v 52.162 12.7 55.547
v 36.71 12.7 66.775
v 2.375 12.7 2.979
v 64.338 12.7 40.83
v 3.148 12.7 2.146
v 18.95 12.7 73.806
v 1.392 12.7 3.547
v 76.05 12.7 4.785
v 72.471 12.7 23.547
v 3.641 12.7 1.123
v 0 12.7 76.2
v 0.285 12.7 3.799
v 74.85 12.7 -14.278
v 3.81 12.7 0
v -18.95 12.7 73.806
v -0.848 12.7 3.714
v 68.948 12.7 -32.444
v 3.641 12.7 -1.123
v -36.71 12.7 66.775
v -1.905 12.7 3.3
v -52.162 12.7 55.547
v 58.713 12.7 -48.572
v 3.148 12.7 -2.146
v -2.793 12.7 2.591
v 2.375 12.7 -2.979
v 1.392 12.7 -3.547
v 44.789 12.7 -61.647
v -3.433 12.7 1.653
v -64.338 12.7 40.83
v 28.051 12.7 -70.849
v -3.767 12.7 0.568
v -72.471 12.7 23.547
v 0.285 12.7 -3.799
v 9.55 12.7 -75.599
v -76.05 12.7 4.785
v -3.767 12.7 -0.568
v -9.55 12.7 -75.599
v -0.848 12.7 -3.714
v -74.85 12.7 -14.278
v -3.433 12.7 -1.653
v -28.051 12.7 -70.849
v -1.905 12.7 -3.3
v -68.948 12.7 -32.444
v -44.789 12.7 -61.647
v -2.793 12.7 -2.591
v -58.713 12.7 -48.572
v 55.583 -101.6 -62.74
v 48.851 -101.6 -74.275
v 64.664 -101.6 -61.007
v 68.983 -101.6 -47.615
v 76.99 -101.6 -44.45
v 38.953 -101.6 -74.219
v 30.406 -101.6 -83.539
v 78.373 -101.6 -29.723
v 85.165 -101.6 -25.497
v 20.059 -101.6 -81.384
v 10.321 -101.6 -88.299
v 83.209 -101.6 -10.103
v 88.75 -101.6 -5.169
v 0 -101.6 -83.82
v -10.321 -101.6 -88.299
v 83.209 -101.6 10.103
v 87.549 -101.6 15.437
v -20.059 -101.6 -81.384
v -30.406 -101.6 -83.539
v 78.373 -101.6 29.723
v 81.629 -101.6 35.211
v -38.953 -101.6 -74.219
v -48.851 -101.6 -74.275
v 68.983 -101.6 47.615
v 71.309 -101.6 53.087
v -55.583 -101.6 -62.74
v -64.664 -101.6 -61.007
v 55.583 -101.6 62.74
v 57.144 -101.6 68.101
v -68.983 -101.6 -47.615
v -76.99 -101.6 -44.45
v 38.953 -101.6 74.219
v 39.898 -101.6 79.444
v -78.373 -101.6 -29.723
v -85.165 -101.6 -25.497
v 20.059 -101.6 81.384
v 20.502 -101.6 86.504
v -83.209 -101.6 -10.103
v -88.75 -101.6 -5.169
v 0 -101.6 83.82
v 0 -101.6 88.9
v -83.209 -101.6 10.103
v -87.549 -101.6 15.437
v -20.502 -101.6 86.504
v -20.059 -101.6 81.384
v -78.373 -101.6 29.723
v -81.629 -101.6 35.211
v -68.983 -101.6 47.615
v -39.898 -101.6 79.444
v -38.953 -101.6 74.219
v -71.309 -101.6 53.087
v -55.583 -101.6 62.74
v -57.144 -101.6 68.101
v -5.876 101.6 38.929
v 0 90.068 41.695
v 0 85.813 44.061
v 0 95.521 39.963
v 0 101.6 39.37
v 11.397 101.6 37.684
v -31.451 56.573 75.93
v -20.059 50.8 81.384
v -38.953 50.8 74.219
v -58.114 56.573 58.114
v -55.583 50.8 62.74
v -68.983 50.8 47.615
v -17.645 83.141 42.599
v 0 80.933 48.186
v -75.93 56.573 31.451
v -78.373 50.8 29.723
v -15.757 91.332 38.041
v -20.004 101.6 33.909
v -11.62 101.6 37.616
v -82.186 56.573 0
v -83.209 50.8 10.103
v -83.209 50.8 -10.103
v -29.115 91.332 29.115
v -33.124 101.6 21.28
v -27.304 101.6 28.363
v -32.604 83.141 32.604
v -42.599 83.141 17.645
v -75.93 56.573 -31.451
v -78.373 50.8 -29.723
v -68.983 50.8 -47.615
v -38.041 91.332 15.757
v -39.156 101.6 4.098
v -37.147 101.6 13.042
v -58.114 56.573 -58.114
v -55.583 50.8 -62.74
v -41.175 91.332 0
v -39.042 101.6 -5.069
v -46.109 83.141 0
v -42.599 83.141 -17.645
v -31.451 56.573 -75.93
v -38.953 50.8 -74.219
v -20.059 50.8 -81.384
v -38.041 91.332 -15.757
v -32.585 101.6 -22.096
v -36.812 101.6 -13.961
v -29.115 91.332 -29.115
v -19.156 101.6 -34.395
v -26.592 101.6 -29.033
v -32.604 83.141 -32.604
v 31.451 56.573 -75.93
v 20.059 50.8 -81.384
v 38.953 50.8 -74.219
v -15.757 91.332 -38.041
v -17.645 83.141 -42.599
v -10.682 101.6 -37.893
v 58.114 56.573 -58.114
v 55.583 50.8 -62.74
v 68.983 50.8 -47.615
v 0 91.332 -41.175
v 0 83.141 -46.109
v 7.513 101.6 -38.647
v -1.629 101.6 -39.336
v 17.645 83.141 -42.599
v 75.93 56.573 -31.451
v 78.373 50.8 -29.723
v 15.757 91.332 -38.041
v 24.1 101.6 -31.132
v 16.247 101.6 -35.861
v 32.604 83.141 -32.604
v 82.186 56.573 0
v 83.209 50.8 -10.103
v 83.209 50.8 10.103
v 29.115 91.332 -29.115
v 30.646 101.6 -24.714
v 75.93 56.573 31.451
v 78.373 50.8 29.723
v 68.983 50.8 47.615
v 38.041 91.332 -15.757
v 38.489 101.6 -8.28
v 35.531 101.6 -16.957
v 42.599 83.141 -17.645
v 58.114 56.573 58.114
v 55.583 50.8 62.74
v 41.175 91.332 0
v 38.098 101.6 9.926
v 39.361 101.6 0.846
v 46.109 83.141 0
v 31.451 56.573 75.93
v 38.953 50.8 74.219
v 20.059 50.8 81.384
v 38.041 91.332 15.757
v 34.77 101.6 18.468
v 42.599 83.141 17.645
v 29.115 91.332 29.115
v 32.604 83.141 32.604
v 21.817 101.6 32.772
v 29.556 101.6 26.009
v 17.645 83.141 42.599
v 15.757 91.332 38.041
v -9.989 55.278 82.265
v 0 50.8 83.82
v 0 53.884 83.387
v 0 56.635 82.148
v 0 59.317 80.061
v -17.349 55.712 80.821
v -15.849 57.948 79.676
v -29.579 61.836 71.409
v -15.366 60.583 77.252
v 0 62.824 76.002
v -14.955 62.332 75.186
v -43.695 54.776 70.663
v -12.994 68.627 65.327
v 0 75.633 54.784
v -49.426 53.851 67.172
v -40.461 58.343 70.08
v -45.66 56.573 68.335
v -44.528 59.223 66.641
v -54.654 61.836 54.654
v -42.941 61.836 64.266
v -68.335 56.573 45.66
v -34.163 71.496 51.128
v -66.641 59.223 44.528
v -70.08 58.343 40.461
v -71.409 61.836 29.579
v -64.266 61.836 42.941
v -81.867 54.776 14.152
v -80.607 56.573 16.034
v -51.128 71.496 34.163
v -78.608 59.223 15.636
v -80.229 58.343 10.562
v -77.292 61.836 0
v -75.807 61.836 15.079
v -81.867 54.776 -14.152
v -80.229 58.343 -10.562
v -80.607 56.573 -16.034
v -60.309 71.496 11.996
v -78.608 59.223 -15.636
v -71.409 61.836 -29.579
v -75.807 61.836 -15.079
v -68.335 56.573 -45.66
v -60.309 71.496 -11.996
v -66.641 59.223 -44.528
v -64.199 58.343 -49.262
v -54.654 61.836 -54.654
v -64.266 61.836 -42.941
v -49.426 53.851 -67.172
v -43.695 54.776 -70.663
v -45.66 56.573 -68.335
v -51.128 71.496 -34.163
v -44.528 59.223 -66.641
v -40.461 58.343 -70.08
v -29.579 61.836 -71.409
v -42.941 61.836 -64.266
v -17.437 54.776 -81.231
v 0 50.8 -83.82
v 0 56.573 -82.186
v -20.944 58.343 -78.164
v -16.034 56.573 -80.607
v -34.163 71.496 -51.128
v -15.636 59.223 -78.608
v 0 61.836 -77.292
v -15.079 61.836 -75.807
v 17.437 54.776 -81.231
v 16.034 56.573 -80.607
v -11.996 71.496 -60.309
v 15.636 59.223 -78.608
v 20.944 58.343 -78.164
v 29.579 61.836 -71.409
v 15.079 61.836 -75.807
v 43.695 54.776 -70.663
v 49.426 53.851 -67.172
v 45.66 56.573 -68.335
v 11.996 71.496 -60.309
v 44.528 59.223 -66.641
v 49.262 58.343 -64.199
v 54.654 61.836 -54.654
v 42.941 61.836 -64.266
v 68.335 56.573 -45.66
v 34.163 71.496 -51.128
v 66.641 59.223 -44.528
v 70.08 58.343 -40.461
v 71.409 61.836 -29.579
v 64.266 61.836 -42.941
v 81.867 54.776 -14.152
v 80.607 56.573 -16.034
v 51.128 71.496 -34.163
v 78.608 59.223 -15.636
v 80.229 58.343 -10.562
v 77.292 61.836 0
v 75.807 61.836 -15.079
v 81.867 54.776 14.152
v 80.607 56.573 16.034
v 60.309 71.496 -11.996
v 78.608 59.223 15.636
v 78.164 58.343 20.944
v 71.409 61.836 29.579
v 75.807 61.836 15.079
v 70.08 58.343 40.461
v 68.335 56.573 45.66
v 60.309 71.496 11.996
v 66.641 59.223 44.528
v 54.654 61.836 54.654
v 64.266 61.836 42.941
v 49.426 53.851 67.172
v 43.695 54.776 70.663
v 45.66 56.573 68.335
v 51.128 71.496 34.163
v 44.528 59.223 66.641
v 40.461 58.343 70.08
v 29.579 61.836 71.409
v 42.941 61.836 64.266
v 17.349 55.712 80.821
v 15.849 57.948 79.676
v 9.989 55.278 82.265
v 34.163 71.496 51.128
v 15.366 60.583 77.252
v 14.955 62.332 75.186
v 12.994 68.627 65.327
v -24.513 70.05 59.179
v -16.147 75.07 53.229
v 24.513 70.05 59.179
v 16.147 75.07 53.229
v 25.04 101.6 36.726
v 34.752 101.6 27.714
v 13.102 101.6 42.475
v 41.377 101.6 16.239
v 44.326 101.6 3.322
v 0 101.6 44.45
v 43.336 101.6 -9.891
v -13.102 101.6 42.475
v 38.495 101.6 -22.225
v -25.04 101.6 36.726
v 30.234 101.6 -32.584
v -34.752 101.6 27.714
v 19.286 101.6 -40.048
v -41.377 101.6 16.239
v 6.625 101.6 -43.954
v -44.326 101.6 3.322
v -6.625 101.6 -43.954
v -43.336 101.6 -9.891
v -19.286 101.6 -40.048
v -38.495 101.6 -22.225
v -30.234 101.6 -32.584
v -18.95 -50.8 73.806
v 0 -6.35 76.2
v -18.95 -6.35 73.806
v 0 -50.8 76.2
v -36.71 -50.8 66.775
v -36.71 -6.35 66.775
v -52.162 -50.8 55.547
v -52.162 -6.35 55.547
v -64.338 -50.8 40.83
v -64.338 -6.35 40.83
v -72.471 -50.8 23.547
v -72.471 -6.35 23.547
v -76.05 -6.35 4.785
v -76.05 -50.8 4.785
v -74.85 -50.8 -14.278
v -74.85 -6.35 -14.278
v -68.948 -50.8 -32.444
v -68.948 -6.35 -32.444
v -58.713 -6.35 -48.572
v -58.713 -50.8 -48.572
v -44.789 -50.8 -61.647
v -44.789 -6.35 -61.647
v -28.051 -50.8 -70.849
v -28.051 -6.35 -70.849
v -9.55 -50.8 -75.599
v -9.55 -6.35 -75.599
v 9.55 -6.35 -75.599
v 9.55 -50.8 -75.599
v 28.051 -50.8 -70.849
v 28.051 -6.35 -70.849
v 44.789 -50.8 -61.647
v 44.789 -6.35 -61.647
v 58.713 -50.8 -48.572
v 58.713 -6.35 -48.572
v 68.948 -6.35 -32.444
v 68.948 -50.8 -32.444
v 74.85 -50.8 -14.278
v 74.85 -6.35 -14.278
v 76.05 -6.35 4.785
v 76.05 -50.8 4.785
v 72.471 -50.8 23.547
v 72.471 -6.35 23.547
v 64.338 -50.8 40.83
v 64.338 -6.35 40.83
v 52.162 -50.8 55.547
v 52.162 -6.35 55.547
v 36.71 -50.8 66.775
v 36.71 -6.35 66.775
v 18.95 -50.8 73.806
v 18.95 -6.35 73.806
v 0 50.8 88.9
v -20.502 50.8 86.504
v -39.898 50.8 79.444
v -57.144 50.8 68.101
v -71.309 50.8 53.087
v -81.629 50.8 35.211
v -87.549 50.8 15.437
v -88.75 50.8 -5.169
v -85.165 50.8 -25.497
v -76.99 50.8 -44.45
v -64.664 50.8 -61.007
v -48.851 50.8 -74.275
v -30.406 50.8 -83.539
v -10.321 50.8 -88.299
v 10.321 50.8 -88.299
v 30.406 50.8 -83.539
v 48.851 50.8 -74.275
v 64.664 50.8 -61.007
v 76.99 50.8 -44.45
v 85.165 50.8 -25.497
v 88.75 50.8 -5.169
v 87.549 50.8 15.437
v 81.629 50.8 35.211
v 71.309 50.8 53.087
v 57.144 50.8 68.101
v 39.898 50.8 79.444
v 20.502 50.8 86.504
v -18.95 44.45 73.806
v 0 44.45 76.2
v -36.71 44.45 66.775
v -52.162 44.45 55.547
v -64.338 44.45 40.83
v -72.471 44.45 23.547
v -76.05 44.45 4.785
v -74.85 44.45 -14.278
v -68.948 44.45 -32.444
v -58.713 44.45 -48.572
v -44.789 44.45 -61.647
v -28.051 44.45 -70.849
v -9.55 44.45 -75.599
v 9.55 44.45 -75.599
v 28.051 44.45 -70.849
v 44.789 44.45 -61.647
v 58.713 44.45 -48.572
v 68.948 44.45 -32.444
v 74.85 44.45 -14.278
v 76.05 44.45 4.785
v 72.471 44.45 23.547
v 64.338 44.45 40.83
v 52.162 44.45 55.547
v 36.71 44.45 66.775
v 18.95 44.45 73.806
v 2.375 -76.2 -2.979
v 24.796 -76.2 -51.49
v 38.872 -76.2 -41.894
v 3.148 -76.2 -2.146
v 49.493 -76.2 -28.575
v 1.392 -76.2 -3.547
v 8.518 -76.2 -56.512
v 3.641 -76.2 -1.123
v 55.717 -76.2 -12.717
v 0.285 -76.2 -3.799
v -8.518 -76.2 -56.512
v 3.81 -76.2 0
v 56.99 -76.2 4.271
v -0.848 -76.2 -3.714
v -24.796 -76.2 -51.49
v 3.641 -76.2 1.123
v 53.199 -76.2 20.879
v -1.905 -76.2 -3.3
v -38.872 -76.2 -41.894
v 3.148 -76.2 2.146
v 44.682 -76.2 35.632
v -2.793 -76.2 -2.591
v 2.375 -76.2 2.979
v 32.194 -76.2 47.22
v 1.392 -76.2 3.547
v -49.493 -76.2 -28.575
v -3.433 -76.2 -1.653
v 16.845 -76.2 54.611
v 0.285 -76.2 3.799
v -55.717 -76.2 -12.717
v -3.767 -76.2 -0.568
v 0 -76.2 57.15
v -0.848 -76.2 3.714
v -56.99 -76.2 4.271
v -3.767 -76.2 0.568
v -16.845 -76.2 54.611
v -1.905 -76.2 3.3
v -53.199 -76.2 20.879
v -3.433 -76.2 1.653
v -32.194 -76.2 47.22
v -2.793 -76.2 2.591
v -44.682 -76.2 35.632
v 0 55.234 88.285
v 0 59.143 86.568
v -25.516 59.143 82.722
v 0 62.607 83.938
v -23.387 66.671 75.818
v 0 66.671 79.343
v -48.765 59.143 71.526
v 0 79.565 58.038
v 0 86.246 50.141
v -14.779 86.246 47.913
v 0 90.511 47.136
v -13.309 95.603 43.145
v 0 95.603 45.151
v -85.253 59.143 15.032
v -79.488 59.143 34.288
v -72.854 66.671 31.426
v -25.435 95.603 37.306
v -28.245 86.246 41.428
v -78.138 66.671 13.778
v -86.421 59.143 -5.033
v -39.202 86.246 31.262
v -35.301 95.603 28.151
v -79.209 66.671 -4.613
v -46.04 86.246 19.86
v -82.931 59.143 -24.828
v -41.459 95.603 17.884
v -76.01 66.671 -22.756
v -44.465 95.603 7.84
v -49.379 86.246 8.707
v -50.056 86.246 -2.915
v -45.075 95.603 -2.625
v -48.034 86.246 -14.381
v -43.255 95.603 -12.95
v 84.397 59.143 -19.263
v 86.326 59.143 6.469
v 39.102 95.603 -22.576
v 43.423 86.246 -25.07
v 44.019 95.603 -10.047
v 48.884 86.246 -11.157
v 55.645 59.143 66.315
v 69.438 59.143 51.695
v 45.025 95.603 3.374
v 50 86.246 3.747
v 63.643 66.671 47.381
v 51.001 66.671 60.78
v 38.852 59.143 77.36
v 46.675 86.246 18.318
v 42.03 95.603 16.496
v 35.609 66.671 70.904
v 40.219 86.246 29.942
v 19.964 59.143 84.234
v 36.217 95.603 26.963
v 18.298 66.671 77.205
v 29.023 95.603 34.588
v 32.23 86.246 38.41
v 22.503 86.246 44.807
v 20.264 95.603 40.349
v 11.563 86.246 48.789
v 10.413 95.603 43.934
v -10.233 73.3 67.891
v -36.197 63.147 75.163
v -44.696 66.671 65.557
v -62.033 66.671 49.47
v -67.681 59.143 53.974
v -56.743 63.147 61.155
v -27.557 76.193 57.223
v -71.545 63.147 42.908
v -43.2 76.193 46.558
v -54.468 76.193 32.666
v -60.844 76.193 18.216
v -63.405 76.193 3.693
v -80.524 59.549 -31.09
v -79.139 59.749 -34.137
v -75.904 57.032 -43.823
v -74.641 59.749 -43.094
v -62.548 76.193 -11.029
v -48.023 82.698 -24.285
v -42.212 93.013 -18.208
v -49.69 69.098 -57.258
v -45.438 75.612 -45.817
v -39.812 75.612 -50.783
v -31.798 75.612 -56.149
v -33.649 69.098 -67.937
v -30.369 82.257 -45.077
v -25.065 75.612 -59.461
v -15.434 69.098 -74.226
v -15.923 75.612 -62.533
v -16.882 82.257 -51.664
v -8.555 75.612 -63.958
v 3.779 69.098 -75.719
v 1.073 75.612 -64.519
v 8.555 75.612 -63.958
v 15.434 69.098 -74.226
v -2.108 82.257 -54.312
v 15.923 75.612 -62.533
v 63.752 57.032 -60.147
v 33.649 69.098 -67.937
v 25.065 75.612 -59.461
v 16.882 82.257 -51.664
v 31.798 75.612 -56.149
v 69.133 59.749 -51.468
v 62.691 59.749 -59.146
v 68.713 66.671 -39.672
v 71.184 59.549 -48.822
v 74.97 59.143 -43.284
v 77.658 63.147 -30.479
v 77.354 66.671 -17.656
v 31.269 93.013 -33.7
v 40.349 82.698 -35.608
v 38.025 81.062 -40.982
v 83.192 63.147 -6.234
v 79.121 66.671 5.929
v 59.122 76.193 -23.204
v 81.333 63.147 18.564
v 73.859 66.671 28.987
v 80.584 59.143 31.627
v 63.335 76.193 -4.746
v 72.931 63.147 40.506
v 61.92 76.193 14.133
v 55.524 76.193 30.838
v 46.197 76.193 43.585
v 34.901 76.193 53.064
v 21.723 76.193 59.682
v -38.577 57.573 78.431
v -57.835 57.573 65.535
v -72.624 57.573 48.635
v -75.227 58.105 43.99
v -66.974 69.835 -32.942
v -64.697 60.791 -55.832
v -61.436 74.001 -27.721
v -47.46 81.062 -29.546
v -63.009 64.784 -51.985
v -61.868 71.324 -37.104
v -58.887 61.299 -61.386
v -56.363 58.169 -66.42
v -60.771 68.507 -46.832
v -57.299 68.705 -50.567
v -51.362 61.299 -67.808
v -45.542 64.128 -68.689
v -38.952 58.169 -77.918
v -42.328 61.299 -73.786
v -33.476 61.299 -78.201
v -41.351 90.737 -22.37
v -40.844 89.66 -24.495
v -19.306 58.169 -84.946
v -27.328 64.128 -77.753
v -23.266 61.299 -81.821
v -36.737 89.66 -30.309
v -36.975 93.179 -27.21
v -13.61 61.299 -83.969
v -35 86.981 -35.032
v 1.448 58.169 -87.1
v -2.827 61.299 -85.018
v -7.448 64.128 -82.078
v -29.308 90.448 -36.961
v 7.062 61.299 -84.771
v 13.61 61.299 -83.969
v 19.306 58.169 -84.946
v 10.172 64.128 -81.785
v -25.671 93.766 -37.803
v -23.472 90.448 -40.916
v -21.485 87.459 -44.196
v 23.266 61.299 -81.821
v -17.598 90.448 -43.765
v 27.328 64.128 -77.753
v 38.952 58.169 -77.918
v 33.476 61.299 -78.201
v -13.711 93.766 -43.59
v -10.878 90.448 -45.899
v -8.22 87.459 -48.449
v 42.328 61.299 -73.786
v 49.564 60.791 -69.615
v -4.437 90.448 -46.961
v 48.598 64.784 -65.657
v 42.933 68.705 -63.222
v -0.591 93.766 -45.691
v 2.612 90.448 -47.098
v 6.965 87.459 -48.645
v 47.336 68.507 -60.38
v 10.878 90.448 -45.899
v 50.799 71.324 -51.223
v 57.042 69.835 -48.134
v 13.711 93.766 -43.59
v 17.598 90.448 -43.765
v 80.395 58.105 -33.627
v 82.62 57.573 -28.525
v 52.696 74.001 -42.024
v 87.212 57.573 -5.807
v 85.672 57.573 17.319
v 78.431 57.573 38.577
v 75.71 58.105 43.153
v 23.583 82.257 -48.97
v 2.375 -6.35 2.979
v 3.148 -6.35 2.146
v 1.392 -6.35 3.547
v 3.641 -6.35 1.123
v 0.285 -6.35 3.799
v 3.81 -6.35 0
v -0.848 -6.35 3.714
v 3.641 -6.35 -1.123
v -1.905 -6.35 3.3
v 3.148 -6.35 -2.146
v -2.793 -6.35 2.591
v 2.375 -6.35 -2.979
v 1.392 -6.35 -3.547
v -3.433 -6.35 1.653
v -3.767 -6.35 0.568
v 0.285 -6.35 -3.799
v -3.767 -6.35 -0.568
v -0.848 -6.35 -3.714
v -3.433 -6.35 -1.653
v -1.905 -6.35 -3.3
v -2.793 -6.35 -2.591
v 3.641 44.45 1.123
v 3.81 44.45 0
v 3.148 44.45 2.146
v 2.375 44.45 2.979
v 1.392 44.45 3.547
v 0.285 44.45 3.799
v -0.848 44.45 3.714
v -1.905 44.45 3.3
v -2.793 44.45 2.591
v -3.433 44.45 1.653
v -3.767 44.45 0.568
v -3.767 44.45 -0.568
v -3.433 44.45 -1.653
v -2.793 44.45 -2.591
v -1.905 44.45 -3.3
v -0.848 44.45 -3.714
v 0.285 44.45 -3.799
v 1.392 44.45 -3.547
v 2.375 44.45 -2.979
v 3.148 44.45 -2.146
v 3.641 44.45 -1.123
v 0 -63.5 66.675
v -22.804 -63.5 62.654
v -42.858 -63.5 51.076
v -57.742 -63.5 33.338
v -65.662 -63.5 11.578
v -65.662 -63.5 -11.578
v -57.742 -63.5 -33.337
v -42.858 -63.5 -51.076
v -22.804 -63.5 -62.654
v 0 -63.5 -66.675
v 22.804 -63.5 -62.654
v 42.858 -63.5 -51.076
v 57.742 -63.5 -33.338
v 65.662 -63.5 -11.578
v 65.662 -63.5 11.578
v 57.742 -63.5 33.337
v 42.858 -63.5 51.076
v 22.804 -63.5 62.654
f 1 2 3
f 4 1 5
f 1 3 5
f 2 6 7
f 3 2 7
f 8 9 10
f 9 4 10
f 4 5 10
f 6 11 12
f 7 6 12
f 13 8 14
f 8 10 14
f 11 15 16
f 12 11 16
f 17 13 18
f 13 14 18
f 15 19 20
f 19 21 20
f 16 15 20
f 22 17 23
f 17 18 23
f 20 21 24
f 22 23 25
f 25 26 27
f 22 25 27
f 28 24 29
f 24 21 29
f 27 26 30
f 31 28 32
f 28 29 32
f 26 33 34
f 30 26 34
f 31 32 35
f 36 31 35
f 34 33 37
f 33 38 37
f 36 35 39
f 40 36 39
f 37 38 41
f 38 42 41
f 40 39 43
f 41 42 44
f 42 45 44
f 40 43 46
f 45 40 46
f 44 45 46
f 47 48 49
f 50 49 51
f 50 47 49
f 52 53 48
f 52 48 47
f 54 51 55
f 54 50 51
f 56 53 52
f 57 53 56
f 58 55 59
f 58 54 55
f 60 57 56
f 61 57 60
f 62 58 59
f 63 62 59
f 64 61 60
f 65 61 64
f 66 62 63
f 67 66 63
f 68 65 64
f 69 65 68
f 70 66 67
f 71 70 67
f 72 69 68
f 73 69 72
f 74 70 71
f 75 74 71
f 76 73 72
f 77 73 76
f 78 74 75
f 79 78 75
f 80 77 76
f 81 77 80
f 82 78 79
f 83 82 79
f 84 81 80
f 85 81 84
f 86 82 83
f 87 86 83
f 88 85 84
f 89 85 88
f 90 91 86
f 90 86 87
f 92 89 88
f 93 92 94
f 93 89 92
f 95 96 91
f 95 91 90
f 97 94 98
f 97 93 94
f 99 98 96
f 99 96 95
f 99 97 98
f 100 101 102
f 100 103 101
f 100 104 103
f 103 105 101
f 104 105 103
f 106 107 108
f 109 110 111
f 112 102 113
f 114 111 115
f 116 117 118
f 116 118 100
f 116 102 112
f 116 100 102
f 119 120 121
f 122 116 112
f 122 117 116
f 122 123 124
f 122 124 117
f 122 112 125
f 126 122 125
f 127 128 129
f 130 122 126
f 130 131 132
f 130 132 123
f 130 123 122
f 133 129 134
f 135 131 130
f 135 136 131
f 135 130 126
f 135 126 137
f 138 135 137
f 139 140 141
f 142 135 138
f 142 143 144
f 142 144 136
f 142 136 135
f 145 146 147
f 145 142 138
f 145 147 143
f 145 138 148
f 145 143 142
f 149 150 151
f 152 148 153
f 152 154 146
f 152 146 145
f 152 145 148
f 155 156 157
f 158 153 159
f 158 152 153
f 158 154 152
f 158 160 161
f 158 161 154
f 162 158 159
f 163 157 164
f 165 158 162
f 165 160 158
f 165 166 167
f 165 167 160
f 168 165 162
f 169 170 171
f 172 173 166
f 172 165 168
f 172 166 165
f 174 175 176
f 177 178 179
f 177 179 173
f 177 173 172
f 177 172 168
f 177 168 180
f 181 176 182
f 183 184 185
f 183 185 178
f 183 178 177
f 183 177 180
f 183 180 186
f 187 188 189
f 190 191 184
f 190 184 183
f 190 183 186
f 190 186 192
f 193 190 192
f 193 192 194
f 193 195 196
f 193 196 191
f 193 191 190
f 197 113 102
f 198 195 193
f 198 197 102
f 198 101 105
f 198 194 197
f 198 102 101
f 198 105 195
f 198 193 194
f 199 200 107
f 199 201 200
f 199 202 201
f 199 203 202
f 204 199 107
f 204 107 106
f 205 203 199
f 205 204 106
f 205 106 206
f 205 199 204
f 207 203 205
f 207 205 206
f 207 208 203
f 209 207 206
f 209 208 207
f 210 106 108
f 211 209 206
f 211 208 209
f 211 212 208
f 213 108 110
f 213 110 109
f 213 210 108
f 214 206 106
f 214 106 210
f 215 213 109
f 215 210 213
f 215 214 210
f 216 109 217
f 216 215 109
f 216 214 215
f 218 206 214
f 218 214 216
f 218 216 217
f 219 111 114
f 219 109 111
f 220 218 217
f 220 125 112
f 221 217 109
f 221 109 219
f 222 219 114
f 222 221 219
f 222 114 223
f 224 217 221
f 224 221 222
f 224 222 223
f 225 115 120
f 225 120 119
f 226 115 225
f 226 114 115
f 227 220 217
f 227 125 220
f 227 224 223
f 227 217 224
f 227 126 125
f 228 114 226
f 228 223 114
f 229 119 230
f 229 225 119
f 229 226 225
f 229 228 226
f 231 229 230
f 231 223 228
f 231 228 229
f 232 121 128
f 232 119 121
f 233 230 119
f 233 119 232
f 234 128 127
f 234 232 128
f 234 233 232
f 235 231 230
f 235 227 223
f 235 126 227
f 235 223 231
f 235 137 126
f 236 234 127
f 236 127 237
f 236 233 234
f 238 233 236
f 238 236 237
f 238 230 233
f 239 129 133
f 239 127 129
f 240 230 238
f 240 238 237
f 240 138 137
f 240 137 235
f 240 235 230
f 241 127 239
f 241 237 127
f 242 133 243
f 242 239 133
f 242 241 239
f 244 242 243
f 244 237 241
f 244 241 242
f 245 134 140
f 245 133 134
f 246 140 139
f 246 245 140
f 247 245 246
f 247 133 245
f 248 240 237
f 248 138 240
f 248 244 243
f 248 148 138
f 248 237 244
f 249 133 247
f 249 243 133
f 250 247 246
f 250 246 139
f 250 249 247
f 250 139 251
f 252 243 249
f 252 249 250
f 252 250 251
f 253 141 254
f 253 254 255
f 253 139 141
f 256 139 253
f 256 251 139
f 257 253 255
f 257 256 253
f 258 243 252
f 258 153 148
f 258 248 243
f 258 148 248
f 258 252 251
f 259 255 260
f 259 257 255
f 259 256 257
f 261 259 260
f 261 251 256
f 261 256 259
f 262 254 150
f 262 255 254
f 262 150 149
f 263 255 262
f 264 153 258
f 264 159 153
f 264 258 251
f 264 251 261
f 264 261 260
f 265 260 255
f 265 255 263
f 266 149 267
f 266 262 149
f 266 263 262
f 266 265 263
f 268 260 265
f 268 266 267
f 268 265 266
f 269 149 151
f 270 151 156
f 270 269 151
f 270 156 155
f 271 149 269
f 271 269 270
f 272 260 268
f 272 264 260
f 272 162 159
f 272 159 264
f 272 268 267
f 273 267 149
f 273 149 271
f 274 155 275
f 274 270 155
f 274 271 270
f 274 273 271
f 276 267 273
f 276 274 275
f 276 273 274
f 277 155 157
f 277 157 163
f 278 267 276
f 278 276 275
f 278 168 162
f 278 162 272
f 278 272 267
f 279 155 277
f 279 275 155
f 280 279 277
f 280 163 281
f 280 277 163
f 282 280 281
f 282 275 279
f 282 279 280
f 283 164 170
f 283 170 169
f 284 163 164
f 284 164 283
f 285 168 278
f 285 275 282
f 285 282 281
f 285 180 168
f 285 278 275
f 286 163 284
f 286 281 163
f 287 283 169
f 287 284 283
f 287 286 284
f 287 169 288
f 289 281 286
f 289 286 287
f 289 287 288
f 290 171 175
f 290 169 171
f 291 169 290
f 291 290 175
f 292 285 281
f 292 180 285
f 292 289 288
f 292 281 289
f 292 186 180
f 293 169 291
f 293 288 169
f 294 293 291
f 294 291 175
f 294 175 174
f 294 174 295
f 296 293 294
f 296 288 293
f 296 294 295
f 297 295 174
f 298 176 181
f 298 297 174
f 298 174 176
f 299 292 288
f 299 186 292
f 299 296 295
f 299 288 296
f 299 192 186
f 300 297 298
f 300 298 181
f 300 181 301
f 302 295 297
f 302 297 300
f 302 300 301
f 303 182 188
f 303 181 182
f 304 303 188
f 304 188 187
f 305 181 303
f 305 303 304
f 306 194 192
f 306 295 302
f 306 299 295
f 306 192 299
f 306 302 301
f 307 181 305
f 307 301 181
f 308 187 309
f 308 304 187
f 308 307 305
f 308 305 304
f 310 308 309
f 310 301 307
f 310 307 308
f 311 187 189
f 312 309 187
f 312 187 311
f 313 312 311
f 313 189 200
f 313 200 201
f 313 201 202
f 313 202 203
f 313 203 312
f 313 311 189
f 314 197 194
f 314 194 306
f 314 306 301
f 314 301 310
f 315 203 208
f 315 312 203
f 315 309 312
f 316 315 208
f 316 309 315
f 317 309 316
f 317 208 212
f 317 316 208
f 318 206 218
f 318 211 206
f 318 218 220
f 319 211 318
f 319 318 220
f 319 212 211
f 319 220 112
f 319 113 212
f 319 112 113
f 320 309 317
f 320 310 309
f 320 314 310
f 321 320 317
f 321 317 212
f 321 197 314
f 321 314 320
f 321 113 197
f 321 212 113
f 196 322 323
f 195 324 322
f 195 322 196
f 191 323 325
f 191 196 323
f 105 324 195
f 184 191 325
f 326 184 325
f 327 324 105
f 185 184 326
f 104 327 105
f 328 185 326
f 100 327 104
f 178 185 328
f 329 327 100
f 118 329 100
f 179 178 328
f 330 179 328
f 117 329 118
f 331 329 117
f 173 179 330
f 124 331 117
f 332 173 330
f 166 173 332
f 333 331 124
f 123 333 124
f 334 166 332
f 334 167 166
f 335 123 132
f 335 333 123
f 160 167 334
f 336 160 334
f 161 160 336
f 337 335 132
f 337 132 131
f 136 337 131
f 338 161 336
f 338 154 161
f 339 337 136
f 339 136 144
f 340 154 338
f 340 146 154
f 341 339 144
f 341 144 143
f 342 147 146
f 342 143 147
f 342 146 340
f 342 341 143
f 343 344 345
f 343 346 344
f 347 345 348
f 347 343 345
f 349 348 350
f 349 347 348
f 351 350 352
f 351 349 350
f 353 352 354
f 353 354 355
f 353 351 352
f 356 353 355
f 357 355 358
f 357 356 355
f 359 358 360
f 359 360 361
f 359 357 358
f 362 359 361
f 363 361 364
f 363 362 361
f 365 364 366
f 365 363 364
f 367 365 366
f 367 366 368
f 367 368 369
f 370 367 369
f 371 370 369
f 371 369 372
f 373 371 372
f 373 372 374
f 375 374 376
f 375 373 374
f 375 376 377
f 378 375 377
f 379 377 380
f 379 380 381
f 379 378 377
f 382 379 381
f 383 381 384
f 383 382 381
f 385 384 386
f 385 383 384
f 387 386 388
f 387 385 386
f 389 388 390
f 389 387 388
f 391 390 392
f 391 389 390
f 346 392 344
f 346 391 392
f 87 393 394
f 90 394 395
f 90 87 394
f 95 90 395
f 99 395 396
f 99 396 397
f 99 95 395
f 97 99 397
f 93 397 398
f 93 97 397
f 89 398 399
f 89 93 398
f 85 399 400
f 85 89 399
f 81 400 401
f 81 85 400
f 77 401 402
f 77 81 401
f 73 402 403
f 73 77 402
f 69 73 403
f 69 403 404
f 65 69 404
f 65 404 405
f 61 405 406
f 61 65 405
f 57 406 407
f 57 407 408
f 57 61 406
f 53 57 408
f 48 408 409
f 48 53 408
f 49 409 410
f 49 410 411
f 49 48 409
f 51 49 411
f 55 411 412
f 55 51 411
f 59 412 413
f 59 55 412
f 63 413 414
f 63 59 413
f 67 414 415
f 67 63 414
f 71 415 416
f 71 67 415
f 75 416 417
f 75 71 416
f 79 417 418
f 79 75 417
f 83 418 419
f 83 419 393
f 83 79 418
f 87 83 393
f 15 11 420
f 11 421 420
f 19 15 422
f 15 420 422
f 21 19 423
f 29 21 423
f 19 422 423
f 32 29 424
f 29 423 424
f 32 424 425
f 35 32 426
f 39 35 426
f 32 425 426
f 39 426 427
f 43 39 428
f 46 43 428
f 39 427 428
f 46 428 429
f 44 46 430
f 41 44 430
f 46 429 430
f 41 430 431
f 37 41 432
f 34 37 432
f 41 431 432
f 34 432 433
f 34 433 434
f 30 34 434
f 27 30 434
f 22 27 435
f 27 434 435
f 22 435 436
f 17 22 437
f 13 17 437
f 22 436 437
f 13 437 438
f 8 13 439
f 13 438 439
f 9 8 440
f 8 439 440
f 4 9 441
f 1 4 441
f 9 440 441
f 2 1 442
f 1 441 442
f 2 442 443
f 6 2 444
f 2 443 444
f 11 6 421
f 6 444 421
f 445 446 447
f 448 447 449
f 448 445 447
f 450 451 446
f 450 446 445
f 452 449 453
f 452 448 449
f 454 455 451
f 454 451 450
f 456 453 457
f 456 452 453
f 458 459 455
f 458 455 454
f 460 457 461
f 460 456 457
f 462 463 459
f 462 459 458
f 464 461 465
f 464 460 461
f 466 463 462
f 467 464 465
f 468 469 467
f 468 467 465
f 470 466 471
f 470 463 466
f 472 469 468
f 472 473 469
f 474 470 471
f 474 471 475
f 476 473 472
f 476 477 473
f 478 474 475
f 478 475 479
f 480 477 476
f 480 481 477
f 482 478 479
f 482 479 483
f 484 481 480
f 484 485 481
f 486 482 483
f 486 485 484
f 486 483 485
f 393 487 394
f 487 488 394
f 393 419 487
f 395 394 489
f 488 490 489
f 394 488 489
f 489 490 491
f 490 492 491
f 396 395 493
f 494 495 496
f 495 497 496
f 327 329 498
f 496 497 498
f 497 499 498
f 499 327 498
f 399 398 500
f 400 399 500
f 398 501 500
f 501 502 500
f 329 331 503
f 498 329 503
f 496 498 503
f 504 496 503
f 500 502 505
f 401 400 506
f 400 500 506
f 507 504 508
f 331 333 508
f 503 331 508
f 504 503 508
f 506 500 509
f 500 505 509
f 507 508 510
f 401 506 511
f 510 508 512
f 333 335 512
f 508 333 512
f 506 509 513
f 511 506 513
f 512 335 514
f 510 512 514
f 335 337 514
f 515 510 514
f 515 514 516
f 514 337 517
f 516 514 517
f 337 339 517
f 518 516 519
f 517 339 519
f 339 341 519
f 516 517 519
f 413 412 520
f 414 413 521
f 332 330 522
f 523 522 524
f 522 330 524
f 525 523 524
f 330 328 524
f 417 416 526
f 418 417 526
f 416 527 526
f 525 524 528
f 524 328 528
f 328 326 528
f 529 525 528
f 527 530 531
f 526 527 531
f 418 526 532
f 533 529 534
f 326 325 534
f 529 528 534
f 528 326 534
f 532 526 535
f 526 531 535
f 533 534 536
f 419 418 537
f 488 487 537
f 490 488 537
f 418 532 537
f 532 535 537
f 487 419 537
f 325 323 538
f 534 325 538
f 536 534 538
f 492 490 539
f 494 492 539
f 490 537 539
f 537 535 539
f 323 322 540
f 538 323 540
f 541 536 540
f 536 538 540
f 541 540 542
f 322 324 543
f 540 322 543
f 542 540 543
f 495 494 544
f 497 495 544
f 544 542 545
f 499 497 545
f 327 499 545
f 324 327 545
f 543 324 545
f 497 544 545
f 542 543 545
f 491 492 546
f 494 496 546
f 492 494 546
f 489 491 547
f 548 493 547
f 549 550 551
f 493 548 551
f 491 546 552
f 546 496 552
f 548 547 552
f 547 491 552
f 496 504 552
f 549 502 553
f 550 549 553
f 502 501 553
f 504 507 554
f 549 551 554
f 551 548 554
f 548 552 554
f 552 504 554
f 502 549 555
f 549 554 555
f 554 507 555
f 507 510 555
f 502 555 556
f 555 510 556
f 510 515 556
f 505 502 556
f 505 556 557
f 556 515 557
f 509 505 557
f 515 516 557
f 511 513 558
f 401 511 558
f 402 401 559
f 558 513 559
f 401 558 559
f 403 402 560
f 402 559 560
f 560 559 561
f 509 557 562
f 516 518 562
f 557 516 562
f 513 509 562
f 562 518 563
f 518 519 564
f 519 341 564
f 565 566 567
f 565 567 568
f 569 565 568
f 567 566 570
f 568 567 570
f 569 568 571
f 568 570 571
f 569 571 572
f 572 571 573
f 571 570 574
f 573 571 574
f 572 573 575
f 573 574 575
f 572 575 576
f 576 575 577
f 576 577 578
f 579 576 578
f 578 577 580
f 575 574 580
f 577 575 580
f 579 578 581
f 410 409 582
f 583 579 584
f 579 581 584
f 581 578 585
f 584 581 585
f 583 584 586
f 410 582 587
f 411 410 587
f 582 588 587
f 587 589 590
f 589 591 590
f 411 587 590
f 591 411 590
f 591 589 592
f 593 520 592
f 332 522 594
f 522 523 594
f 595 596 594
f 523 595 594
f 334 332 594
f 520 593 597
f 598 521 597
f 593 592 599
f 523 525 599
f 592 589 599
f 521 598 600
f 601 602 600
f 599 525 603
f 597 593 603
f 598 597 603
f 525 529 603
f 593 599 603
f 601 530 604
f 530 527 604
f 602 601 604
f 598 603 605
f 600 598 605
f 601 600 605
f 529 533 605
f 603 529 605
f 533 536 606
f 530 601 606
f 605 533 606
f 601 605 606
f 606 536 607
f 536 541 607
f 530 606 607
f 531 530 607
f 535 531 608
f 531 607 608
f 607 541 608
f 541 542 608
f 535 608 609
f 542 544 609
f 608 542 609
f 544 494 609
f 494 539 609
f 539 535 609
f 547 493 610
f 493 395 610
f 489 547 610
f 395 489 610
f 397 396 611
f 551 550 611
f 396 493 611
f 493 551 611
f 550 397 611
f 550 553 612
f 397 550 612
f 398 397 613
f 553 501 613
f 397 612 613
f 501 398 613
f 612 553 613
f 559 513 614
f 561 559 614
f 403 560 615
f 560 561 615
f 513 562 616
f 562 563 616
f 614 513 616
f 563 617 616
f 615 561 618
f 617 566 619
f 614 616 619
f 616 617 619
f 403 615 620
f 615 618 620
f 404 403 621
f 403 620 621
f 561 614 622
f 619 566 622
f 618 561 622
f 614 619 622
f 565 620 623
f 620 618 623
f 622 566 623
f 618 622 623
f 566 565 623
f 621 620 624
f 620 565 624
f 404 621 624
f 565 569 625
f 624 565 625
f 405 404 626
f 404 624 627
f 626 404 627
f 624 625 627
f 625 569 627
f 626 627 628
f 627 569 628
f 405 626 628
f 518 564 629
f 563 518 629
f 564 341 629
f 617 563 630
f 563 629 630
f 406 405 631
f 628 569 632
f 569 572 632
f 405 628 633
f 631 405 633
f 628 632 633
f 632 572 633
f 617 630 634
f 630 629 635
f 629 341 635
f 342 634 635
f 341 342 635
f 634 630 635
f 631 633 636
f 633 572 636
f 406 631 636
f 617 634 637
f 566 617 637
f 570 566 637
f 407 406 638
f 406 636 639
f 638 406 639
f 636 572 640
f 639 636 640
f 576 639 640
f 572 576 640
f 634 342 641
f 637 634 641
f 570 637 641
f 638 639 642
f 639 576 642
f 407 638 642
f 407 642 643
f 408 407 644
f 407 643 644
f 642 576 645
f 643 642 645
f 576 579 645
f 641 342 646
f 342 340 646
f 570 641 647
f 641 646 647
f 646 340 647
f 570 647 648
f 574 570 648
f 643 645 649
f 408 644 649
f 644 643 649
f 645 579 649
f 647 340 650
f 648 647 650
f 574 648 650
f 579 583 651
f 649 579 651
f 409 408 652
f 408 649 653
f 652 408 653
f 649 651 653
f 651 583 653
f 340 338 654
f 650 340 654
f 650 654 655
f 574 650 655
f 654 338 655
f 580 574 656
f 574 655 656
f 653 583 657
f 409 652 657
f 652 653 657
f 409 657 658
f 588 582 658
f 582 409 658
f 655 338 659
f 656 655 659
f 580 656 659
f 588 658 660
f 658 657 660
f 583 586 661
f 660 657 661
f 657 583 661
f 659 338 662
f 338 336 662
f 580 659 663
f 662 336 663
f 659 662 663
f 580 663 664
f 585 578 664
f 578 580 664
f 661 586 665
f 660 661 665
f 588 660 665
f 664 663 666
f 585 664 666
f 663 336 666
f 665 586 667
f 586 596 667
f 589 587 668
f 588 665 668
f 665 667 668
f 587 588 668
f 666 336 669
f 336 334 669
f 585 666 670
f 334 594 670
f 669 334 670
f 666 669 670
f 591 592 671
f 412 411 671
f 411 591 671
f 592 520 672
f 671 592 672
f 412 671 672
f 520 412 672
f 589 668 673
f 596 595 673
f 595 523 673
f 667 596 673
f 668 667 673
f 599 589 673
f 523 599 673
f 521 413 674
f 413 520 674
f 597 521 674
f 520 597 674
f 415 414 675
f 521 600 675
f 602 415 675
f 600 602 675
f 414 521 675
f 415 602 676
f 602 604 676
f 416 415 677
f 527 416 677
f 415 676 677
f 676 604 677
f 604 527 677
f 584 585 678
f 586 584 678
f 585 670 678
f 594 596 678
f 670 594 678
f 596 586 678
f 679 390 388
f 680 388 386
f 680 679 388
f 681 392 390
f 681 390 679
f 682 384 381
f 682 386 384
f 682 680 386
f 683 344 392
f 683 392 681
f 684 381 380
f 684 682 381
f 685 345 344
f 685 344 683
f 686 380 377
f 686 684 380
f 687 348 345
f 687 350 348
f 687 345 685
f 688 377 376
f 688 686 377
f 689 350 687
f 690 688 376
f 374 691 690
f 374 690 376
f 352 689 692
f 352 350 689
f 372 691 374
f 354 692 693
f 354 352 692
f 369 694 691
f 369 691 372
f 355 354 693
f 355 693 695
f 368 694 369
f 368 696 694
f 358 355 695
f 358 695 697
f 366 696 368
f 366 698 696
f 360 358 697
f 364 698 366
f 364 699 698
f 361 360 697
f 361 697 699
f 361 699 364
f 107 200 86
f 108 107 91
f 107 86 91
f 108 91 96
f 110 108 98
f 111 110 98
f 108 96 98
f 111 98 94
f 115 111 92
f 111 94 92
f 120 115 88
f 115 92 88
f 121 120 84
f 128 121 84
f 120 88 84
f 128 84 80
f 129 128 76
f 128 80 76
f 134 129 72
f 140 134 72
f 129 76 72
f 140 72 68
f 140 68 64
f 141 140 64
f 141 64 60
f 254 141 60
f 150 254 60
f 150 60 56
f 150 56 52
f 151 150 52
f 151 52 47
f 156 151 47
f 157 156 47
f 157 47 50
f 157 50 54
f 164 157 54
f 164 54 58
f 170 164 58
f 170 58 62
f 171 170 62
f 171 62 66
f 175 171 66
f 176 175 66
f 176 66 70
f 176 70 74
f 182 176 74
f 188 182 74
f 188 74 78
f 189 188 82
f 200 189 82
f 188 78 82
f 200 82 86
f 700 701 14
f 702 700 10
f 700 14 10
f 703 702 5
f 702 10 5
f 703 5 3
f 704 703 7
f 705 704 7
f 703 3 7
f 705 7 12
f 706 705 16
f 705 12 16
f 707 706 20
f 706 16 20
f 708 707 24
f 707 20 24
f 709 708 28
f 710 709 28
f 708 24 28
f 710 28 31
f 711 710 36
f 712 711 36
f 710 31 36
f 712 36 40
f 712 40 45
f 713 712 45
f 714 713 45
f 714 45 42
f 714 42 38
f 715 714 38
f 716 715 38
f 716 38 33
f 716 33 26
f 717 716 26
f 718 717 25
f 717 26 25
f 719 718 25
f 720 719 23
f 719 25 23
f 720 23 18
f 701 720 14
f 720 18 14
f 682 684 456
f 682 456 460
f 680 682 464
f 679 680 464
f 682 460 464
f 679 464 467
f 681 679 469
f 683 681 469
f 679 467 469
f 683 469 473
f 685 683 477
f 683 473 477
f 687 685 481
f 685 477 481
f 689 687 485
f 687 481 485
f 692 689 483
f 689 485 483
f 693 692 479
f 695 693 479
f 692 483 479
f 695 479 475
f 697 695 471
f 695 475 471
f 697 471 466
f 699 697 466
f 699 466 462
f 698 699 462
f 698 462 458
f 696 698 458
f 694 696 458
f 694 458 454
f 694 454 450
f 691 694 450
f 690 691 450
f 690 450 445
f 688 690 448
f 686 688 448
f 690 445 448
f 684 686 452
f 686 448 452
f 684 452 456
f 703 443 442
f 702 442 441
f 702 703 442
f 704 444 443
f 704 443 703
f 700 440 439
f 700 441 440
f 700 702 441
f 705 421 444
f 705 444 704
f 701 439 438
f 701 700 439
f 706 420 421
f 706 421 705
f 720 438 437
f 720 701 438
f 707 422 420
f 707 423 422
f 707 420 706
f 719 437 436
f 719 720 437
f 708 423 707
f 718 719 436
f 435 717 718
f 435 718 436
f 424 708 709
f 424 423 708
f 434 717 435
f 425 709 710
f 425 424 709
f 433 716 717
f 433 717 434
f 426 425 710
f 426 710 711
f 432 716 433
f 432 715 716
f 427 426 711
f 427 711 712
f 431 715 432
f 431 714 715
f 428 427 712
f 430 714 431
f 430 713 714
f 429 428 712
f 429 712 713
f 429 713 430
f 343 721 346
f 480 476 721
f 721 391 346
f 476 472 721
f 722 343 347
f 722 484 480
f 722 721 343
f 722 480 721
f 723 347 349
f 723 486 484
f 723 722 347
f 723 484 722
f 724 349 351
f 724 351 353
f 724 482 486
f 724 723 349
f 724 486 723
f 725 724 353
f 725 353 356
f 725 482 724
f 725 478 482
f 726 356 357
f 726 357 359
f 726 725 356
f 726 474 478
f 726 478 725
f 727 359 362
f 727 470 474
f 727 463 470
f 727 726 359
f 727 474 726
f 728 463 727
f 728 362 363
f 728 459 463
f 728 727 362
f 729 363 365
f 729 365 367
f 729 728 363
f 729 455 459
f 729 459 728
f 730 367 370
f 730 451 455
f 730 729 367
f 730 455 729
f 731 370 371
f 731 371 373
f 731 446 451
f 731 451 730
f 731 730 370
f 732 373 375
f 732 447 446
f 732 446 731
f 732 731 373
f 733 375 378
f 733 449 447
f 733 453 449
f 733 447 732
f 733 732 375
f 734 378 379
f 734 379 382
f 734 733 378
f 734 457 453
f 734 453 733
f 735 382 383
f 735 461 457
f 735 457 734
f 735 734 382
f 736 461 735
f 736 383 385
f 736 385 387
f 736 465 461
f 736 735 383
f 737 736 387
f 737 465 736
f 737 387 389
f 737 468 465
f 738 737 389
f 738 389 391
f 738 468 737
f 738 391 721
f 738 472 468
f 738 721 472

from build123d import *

# Parameters (mm, degrees)
F0_W     = 31.75
F0_H     = 76.2
F5_T     = -5.08
F3_R     = 3.81
F3_R_2   = 3.175
F7_DEPTH = 1270


# Not quite as in the source:
# - a feature of the source that left no trace in its solid (it failed there, or was rolled back) is left out


with BuildPart() as f1:
    # F0 (on Right) → F1 (revolve)
    with BuildSketch(Plane.YZ):
        with Locations((28.575, 38.1)):
            Rectangle(F0_W, F0_H)
    revolve(axis=Axis((0, 0, 0), (0, -1, 0)))


with BuildPart() as f1b:
    # F0 (on Right) → F1, piece 2 (revolve)
    with BuildSketch(Plane.YZ):
        Polygon((-76.2, 0), (-6.35, 0), (-6.35, 76.2), (-50.8, 76.2), (-76.2, 57.15), align=None)
    revolve(axis=Axis((0, 0, 0), (0, -1, 0)))


with BuildPart() as f4:
    # F0 (on Right) → F4 (revolve)
    with BuildSketch(Plane.YZ):
        with BuildLine():
            Line((44.45, 0), (101.6, 0))
            Line((101.6, 0), (101.6, 44.45))
            add(Edge.make_bspline(
                [(50.8, 88.9), (63.5, 88.9), (75.4157216212, 61.6914388631), (88.9, 44.45), (101.6, 44.45)],
                knots=[0, 0, 0, 0, 0.5154238597, 1, 1, 1, 1], degree=3))
            Line((50.8, 88.9), (-101.6, 88.9))
            Line((-101.6, 88.9), (-101.6, 0))
            Line((-101.6, 0), (-76.2, 0))
            Line((-76.2, 0), (-76.2, 57.15))
            Line((-76.2, 57.15), (-50.8, 76.2))
            Line((-50.8, 76.2), (-6.35, 76.2))
            Line((-6.35, 76.2), (-6.35, 0))
            Line((-6.35, 0), (12.7, 0))
            Line((12.7, 0), (12.7, 76.2))
            Line((12.7, 76.2), (44.45, 76.2))
            Line((44.45, 76.2), (44.45, 0))
        make_face()
        Polygon((-76.2, 0), (-6.35, 0), (-6.35, 76.2), (-50.8, 76.2), (-76.2, 57.15), align=None)
        with Locations((28.575, 38.1)):
            Rectangle(F0_W, F0_H)
    revolve(axis=Axis((0, 0, 0), (0, -1, 0)))

    # F5
    f5_openings = [f4.faces().sort_by_distance(p)[0] for p in [
        (0, -101.6, 0),
        (0, 101.6, 0),
    ]]
    offset(amount=F5_T, openings=f5_openings)


with BuildPart() as f7_tool:
    # F3 (on Front) → F7 (new body, symmetric)
    with BuildSketch(Plane.XZ):
        Circle(F3_R)
        Circle(F3_R_2, mode=Mode.SUBTRACT)
        Circle(F3_R_2)
    extrude(amount=F7_DEPTH, both=True)


with BuildPart() as f1_1:
    add(f1.part)

    # F7: cut by f7_tool
    add(f7_tool.part, mode=Mode.SUBTRACT)


with BuildPart() as f1b_1:
    add(f1b.part)

    # F7: cut by f7_tool
    add(f7_tool.part, mode=Mode.SUBTRACT)


solid = Compound([f4.part, f1_1.part, f1b_1.part])
